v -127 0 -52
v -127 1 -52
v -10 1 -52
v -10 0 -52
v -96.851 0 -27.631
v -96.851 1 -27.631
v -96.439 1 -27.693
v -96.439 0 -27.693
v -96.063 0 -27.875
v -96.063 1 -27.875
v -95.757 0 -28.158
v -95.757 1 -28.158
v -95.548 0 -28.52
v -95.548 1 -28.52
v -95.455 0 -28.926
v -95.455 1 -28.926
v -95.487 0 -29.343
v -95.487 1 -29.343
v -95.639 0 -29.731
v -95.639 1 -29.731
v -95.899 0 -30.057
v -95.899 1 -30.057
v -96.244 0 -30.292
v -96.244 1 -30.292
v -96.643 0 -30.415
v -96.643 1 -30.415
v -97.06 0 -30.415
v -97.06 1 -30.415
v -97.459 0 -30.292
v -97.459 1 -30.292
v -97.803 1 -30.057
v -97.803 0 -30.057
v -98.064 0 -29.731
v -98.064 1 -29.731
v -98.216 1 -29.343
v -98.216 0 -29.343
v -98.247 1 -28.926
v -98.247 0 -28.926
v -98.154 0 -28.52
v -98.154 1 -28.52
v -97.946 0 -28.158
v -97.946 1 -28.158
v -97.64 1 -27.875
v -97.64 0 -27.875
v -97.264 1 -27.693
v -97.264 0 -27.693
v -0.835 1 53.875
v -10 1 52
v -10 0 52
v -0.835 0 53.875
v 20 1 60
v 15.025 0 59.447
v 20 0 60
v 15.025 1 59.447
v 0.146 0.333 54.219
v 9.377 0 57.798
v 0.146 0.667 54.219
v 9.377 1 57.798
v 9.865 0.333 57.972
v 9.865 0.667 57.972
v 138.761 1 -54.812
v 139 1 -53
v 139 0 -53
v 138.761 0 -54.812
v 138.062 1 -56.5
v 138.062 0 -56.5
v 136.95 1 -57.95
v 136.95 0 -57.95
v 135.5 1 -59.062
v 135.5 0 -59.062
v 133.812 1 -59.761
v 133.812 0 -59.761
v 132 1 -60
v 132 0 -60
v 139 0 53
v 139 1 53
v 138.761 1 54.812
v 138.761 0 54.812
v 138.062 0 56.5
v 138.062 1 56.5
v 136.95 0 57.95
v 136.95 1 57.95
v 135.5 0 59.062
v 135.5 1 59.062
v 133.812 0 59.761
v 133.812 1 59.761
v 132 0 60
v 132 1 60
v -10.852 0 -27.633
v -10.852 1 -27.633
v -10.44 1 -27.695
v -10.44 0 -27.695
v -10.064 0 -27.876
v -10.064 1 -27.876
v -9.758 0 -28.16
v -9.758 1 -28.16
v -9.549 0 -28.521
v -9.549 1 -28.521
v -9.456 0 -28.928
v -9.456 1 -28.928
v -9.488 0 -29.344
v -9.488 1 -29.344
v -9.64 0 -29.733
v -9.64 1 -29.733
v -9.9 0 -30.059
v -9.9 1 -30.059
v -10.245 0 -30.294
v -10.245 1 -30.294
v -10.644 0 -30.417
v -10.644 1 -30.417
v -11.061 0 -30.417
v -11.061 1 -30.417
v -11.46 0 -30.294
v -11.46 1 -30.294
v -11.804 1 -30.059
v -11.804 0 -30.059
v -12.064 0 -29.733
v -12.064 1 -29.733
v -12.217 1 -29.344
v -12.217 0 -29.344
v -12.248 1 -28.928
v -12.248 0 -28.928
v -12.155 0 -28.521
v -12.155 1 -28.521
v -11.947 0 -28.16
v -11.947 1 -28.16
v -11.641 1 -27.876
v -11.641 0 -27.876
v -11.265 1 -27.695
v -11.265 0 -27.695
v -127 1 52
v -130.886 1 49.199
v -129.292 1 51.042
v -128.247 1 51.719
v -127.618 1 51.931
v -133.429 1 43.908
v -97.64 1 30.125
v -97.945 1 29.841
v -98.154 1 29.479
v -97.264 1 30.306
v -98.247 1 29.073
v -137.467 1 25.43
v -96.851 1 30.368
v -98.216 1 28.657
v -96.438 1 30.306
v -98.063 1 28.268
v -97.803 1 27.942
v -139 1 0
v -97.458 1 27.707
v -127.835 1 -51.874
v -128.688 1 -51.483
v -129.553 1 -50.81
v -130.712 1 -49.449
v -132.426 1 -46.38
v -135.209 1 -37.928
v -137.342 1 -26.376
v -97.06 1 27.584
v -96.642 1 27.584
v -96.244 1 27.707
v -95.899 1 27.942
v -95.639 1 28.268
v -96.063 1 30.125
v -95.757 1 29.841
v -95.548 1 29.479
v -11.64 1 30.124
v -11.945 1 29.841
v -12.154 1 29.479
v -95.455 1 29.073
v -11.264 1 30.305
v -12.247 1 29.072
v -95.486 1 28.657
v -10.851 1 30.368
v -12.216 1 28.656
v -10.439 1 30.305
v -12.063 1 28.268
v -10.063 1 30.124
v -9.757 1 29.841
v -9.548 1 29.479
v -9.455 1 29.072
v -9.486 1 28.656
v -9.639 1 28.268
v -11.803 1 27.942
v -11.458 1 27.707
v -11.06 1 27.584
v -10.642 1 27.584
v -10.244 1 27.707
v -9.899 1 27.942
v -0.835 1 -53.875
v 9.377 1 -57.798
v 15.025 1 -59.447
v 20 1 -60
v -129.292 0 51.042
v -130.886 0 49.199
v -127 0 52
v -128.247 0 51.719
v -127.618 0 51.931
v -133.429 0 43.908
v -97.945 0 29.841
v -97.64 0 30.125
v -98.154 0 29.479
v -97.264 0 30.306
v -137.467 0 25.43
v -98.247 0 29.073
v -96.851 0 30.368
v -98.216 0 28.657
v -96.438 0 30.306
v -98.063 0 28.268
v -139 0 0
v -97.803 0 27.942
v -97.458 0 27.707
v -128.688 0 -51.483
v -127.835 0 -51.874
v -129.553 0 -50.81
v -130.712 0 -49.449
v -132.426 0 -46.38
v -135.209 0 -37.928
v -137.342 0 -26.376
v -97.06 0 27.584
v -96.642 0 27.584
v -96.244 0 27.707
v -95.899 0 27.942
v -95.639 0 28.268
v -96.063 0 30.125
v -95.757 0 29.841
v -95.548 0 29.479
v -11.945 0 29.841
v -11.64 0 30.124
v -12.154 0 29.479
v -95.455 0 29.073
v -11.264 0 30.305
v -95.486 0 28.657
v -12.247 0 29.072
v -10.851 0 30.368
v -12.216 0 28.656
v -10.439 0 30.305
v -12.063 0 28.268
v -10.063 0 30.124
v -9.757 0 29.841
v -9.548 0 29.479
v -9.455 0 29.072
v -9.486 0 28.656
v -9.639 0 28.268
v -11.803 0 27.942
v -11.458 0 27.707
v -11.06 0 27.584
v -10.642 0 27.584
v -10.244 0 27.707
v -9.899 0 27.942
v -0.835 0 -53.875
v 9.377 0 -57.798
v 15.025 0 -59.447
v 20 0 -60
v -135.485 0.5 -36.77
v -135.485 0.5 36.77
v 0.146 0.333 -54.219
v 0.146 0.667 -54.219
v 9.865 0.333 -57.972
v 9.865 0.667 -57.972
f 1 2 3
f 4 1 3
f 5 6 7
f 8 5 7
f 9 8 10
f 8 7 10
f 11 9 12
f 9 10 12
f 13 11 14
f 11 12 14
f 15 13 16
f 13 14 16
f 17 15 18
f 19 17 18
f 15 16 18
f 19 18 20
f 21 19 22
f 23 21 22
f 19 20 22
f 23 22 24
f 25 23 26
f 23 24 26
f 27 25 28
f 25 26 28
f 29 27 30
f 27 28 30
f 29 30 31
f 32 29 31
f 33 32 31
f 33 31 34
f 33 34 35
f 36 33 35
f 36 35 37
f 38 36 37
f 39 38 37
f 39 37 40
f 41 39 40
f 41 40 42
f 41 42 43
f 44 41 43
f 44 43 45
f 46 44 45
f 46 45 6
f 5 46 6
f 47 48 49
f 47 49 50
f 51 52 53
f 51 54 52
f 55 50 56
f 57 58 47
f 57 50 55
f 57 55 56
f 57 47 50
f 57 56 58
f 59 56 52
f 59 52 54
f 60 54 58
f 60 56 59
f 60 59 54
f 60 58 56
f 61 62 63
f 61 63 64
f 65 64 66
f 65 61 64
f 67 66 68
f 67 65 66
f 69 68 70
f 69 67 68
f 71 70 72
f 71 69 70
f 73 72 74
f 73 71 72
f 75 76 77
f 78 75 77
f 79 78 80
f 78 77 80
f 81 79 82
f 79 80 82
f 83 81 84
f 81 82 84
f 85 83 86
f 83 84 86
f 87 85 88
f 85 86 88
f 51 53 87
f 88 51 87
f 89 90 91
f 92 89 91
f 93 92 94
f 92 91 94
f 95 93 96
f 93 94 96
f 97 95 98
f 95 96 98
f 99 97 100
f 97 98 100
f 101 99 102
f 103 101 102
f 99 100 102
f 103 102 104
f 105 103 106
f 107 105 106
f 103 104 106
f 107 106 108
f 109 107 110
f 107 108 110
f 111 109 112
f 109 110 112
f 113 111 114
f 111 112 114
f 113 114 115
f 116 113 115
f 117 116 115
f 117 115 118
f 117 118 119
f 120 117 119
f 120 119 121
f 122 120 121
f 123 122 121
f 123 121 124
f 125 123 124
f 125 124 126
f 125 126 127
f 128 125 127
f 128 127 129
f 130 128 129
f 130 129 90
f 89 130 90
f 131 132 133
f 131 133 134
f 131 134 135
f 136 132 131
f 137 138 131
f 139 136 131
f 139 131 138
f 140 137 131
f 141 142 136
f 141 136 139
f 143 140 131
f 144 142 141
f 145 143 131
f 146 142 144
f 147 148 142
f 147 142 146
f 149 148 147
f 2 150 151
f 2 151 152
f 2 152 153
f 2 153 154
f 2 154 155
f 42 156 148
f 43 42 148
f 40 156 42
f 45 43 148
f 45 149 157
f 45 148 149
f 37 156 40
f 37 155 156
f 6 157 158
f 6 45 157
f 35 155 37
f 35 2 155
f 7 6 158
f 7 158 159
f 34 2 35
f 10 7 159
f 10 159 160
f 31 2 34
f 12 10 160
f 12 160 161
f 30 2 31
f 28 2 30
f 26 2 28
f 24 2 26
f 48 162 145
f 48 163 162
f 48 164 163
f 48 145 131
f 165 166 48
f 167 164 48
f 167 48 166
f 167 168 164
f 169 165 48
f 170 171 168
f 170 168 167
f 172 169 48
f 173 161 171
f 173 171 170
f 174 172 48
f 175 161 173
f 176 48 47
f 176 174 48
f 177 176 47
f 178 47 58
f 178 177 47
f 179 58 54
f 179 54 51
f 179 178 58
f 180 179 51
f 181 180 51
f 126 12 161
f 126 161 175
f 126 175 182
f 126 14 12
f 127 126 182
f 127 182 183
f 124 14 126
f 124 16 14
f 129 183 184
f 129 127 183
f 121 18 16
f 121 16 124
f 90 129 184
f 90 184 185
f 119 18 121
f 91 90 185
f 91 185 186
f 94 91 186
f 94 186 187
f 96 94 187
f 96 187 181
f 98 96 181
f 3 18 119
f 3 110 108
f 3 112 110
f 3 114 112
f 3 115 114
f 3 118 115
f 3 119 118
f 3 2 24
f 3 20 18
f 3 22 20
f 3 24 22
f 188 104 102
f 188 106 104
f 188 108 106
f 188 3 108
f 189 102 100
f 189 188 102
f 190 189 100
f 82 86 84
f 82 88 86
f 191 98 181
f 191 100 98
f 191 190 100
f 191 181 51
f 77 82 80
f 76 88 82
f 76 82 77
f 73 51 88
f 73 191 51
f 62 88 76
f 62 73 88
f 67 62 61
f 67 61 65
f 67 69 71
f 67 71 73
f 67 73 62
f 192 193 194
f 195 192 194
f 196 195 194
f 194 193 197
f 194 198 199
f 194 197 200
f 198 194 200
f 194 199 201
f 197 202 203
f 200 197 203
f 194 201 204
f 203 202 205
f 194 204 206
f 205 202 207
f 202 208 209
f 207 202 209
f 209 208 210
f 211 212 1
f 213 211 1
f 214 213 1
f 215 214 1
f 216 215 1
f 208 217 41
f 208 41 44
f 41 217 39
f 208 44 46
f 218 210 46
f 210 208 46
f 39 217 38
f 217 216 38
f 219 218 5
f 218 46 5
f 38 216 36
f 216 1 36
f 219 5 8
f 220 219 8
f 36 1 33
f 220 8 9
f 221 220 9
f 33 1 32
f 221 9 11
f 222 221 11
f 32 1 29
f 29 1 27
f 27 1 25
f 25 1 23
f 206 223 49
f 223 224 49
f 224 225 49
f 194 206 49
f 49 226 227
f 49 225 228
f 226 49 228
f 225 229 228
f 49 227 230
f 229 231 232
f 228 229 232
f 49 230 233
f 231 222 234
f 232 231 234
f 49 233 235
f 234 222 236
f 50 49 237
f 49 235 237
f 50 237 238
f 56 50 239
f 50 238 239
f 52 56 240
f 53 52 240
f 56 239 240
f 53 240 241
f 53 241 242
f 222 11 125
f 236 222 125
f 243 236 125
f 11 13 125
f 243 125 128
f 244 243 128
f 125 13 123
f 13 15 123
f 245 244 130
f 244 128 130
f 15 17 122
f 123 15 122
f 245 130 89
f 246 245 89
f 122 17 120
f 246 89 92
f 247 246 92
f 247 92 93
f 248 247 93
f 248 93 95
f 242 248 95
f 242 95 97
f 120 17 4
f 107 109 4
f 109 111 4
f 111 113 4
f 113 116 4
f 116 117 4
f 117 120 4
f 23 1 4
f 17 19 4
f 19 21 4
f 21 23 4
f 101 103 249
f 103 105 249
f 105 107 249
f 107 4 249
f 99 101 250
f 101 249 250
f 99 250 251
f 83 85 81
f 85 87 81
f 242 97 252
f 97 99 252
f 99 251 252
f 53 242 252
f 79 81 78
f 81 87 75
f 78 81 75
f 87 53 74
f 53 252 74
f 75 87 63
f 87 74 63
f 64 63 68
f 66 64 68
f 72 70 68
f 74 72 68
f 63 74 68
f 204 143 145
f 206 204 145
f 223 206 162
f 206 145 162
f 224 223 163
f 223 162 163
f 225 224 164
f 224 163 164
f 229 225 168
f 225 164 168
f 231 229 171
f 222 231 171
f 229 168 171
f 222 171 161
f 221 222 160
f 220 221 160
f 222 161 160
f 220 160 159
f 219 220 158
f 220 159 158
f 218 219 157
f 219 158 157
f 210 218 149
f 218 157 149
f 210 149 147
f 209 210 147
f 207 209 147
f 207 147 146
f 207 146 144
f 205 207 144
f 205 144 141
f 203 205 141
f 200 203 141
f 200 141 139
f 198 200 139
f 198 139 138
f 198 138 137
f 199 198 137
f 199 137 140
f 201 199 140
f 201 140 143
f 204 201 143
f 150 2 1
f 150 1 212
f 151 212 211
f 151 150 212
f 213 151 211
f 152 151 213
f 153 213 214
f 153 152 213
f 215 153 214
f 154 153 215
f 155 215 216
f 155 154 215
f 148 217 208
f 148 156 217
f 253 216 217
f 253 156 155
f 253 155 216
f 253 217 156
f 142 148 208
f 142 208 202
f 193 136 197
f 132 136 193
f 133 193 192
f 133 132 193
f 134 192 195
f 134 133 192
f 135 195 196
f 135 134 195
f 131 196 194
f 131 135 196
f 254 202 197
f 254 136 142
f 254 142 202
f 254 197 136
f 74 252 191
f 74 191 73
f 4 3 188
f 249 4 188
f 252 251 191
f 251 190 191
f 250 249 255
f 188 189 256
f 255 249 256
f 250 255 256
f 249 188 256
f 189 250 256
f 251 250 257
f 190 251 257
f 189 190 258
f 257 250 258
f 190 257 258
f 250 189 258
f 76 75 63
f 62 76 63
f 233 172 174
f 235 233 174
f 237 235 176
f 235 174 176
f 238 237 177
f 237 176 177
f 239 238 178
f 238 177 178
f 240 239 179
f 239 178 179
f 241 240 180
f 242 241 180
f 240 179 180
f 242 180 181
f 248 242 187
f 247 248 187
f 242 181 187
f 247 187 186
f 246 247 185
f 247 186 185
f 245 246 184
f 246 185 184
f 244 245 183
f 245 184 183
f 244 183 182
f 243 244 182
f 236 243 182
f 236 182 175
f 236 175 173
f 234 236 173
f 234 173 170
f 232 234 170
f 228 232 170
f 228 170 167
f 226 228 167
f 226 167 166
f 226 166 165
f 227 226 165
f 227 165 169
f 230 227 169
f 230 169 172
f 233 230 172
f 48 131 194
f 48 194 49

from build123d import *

# Parameters (mm, degrees)
SKETCH_1_W          = 278
SKETCH_1_H          = 120
EXTRUDE_1_DEPTH     = 1
SKETCH_2_W          = 129
SKETCH_2_H          = 8
CUT_EXTRUDE_1_DEPTH = 1
CUT_EXTRUDE_2_DEPTH = 1
CUT_EXTRUDE_4_DEPTH = 1
CUT_EXTRUDE_5_DEPTH = 1
SKETCH_16_R         = 1.39979
CUT_EXTRUDE_9_DEPTH = 10


with BuildPart() as part:
    # 스케치1 → 보스-돌출1 (new body)
    with BuildSketch(Plane(origin=(0, 0, 0), x_dir=(1, 0, 0), z_dir=(0, 1, 0))):
        Rectangle(SKETCH_1_W, SKETCH_1_H)
    extrude(amount=EXTRUDE_1_DEPTH)

    # 스케치2 → 컷-돌출1 (cut)
    with BuildSketch(Plane(origin=(0, 1, 0), x_dir=(1, 0, 0), z_dir=(0, 1, 0))):
        with Locations((-74.5, -56)):
            Rectangle(SKETCH_2_W, SKETCH_2_H)
        with Locations((-74.5, 56)):
            Rectangle(SKETCH_2_W, SKETCH_2_H)
    extrude(amount=-CUT_EXTRUDE_1_DEPTH, mode=Mode.SUBTRACT)

    # 스케치3 → 컷-돌출2 (cut)
    with BuildSketch(Plane(origin=(0, 1, 0), x_dir=(1, 0, 0), z_dir=(0, 1, 0))):
        with BuildLine():
            add(Edge.make_bspline(
                [(-127, 52), (-139, 52), (-139, 0)],
                knots=[3.141592654, 3.141592654, 3.141592654, 4.71238898, 4.71238898, 4.71238898], degree=2, weights=[1, 0.707106781, 1]))
            Line((-127, 52), (-139, 52))
            Line((-139, 52), (-139, 0))
        make_face()
        with BuildLine():
            Line((-139, -52), (-127, -52))
            add(Edge.make_bspline(
                [(-139, 0), (-139, -52), (-127, -52)],
                knots=[4.71238898, 4.71238898, 4.71238898, 6.283185307, 6.283185307, 6.283185307], degree=2, weights=[1, 0.707106781, 1]))
            Line((-139, 0), (-139, -52))
        make_face()
    extrude(amount=-CUT_EXTRUDE_2_DEPTH, mode=Mode.SUBTRACT)

    # 스케치4 → 컷-돌출4 (cut)
    with BuildSketch(Plane(origin=(0, 1, 0), x_dir=(1, 0, 0), z_dir=(0, 1, 0))):
        with BuildLine():
            Line((-10, 52), (-10, 60))
            Line((-10, 60), (20, 60))
            add(Edge.make_bspline(
                [(-10, 52), (0.64121866, 52.367223255), (9.376693721, 59.919927591), (20, 60)],
                knots=[0, 0, 0, 0, 1, 1, 1, 1], degree=3))
        make_face()
        with BuildLine():
            Line((-10, -52), (-10, -60))
            Line((-10, -60), (20, -60))
            add(Edge.make_bspline(
                [(-10, -52), (0.64121866, -52.367223255), (9.376693721, -59.919927591), (20, -60)],
                knots=[0, 0, 0, 0, 1, 1, 1, 1], degree=3))
        make_face()
    extrude(amount=-CUT_EXTRUDE_4_DEPTH, mode=Mode.SUBTRACT)

    # 스케치5 → 컷-돌출5 (cut)
    with BuildSketch(Plane(origin=(0, 1, 0), x_dir=(1, 0, 0), z_dir=(0, 1, 0))):
        with BuildLine():
            Line((132, 60), (139, 60))
            Line((139, 60), (139, 53))
            ThreePointArc((139, 53), (136.949747468, 57.949747468), (132, 60))
        make_face()
        with BuildLine():
            Line((139, -60), (139, -53))
            ThreePointArc((139, -53), (136.949747468, -57.949747468), (132, -60))
            Line((132, -60), (139, -60))
        make_face()
    extrude(amount=-CUT_EXTRUDE_5_DEPTH, mode=Mode.SUBTRACT)

    # 스케치16 → 컷-돌출9 (cut)
    with BuildSketch(Plane(origin=(0, 1, 0), x_dir=(1, 0, 0), z_dir=(0, 1, 0))):
        with Locations(Location((-96.85129, 29.0311, 0), (0, 0, 270))):
            Circle(SKETCH_16_R)
        with Locations(Location((-96.85109, -28.96802, 0), (0, 0, 270))):
            Circle(SKETCH_16_R)
        with Locations(Location((-10.85223, 29.03265, 0), (0, 0, 270))):
            Circle(SKETCH_16_R)
        with Locations(Location((-10.8511, -28.96784, 0), (0, 0, 270))):
            Circle(SKETCH_16_R)
    extrude(amount=-CUT_EXTRUDE_9_DEPTH, mode=Mode.SUBTRACT)


solid = part.part
